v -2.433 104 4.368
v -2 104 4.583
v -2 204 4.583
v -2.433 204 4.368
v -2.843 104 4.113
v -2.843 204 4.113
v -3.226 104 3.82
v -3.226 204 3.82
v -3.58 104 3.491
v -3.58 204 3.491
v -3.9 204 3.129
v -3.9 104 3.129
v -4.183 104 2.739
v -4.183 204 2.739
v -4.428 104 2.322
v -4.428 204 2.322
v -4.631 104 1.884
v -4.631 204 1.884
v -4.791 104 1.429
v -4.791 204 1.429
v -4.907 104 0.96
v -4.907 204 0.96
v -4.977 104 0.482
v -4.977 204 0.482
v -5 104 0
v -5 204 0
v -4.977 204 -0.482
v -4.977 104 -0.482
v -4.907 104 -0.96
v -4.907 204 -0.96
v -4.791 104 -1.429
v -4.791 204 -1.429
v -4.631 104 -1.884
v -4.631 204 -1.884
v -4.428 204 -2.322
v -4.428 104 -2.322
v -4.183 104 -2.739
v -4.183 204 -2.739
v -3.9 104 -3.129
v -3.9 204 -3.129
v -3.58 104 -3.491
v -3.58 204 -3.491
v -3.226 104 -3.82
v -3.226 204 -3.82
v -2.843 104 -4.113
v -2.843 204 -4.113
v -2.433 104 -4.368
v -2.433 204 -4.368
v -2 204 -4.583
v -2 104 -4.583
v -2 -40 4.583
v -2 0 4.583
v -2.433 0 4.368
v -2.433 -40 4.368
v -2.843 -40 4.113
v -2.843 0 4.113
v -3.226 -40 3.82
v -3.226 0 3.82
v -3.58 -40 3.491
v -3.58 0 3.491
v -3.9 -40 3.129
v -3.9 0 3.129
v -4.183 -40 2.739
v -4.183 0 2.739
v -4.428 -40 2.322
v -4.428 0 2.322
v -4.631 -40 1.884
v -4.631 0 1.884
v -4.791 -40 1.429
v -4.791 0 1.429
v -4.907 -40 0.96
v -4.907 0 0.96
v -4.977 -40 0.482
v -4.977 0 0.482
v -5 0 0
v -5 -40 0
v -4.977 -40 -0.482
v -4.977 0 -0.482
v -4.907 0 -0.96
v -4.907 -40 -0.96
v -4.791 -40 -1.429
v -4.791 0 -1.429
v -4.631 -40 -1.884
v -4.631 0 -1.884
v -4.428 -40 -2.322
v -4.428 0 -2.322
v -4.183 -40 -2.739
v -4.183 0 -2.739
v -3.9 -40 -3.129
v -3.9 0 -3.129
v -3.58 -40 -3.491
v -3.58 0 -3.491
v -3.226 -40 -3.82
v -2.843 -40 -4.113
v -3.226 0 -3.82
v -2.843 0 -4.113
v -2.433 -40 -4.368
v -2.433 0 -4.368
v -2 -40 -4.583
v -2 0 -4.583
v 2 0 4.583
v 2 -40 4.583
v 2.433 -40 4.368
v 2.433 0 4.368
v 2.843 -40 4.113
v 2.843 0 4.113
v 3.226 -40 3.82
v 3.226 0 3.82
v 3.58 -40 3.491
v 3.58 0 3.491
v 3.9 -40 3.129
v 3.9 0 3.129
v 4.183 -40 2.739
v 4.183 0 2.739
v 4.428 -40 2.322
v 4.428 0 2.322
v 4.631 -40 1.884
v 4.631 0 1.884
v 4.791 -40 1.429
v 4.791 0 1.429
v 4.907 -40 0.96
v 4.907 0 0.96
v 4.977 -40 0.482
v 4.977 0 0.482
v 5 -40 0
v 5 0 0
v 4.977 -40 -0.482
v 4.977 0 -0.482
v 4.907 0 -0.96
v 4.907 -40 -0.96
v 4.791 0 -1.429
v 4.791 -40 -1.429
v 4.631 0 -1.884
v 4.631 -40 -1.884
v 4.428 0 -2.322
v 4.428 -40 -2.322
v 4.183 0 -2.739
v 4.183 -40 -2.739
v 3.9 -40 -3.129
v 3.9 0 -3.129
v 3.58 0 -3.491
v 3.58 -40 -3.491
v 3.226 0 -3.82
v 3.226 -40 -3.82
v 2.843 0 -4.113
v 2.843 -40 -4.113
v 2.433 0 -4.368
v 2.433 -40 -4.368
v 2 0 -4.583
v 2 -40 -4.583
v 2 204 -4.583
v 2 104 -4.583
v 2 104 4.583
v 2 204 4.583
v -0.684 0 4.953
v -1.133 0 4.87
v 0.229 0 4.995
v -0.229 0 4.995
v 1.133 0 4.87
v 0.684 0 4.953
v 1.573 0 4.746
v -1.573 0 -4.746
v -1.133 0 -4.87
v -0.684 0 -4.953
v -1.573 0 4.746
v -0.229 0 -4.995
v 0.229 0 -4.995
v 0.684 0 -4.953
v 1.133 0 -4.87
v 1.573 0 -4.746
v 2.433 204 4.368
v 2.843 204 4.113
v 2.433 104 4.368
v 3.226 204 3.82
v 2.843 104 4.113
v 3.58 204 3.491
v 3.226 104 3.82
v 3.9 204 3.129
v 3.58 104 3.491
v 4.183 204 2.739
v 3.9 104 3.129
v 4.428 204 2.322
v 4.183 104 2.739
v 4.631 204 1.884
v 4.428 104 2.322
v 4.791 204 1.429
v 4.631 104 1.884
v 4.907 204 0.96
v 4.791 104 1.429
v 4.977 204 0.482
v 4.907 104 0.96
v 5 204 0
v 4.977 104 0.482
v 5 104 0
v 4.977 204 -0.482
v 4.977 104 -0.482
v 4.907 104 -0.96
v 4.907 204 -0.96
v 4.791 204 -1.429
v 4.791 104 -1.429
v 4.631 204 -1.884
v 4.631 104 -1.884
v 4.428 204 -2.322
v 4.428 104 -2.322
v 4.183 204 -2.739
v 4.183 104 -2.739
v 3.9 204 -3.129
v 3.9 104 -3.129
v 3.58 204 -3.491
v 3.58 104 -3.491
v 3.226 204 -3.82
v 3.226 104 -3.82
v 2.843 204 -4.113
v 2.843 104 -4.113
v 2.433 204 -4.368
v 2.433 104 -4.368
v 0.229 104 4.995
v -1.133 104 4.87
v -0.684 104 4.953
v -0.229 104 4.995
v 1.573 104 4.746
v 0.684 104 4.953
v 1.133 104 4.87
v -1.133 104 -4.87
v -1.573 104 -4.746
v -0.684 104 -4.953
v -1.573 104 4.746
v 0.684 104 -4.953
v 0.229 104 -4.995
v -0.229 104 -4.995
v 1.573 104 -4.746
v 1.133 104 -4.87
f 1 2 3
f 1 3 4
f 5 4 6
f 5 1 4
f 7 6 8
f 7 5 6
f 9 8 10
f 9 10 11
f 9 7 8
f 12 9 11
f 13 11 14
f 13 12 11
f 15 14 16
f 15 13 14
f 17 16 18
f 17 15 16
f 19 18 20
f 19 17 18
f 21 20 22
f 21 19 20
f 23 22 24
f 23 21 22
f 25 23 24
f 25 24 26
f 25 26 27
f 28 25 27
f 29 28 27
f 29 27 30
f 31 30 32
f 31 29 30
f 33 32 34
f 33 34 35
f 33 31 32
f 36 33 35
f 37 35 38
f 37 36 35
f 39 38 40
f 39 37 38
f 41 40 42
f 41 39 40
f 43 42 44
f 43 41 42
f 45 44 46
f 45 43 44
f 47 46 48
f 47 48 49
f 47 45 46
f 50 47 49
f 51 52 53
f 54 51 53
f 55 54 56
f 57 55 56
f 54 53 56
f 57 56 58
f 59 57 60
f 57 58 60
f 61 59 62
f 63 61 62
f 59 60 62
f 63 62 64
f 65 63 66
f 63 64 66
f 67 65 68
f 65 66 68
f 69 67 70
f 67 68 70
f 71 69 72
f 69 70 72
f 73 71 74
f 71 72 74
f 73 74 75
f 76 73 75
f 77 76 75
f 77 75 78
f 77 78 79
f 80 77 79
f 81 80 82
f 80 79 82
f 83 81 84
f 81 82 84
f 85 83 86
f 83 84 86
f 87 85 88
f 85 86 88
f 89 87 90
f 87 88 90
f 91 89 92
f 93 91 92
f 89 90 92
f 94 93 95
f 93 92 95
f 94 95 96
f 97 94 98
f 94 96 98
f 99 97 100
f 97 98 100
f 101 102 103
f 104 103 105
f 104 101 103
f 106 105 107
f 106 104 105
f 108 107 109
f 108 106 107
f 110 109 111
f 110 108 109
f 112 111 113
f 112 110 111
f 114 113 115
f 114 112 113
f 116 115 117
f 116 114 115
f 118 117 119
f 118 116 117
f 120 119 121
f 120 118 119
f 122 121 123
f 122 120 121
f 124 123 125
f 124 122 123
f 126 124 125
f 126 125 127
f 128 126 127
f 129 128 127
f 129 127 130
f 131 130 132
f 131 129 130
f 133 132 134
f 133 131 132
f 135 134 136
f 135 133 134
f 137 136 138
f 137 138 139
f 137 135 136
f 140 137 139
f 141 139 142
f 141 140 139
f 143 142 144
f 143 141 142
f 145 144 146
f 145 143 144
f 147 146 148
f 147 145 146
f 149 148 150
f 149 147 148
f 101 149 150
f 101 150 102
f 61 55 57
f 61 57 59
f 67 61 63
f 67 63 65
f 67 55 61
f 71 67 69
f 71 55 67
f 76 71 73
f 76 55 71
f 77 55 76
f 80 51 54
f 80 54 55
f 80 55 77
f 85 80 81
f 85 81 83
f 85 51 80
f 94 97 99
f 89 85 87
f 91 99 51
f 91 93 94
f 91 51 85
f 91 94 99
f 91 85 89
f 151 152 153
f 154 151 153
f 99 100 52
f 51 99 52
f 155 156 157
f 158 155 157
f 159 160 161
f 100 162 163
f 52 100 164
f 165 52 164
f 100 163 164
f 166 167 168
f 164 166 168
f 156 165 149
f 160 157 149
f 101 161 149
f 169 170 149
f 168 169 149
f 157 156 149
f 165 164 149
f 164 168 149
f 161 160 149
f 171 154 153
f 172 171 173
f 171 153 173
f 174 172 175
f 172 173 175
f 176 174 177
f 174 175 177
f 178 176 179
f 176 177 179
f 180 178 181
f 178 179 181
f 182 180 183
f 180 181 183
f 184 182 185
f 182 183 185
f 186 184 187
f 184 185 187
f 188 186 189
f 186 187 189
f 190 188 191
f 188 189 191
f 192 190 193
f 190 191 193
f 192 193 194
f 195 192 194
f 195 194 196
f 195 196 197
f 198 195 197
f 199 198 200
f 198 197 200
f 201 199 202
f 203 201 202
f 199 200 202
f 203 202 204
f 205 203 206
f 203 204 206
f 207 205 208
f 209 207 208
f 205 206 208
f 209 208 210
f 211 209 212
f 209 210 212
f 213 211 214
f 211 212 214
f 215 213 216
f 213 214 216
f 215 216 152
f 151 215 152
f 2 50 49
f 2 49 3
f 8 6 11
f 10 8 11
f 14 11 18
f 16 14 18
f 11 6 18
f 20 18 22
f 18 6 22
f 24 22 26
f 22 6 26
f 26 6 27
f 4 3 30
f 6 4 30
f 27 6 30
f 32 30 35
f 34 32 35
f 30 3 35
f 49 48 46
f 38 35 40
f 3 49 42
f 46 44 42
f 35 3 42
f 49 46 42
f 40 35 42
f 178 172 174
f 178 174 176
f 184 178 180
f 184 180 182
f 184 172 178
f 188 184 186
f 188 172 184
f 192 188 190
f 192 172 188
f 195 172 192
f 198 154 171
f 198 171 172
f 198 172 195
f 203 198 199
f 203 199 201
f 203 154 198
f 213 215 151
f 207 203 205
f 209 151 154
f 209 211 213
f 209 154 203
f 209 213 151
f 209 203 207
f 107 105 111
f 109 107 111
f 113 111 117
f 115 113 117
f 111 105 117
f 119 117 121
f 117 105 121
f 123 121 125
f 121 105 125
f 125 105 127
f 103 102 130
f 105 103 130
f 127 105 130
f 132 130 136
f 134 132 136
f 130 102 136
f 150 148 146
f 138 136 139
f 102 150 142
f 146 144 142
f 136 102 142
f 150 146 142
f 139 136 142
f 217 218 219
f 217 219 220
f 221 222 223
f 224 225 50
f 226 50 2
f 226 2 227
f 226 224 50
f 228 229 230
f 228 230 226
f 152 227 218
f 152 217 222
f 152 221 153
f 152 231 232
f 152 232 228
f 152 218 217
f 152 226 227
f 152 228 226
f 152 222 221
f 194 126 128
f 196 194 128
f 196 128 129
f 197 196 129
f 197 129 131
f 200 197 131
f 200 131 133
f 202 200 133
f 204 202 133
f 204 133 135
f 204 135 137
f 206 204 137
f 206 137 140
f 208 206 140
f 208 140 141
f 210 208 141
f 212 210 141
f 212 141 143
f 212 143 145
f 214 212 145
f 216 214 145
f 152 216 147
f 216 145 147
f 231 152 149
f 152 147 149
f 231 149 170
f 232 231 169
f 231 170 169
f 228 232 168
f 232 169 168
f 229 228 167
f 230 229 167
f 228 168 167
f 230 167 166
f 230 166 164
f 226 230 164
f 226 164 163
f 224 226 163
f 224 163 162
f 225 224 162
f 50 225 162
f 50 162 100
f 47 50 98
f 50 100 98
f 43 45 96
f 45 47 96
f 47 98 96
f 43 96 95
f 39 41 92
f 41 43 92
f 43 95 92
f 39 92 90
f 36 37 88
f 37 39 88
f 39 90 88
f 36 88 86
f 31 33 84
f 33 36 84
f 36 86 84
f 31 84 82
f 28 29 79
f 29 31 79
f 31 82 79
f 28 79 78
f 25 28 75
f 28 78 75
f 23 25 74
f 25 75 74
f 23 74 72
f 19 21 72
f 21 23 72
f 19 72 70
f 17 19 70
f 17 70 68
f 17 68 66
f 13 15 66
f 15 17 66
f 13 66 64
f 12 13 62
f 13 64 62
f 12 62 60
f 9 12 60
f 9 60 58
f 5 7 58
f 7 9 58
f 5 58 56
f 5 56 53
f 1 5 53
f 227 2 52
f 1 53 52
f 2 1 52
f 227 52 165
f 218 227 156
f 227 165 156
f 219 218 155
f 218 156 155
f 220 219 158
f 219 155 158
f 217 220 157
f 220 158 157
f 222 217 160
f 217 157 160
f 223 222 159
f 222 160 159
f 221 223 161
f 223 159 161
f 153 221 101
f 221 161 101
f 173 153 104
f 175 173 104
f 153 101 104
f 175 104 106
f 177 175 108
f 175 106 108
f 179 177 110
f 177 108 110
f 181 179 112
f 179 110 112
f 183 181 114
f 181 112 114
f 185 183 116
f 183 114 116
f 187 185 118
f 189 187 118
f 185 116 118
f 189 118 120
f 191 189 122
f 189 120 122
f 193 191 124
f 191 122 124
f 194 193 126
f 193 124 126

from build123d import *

# Parameters (mm, degrees)
SKETCH1_R           = 5
BOSS_EXTRUDE1_DEPTH = 104
BOSS_EXTRUDE2_DEPTH = 100
BOSS_EXTRUDE3_START = -104
BOSS_EXTRUDE3_DEPTH = 40


with BuildPart() as part:
    # Sketch1 → Boss-Extrude1 (new body)
    with BuildSketch(Plane(origin=(0, 0, 0), x_dir=(1, 0, 0), z_dir=(0, 1, 0))):
        Circle(SKETCH1_R)
    extrude(amount=BOSS_EXTRUDE1_DEPTH)

    # Sketch2 → Boss-Extrude2 (add)
    with BuildSketch(Plane(origin=(0, 104, 0), x_dir=(1, 0, 0), z_dir=(0, 1, 0))):
        with BuildLine():
            Line((-2, 4.582576), (-2, -4.582576))
            ThreePointArc((-2, -4.582576), (-5, 0), (-2, 4.582576))
        make_face()
        with BuildLine():
            Line((2, 4.582576), (2, -4.582576))
            ThreePointArc((2, -4.582576), (5, 0), (2, 4.582576))
        make_face()
    extrude(amount=BOSS_EXTRUDE2_DEPTH)

    # Sketch2<2> → Boss-Extrude3 (add)
    with BuildSketch(Plane(origin=(0, 104, 0), x_dir=(1, 0, 0), z_dir=(0, 1, 0)).offset(BOSS_EXTRUDE3_START)):
        with BuildLine():
            Line((-2, 4.582576), (-2, -4.582576))
            ThreePointArc((-2, -4.582576), (-5, 0), (-2, 4.582576))
        make_face()
        with BuildLine():
            Line((2, 4.582576), (2, -4.582576))
            ThreePointArc((2, -4.582576), (5, 0), (2, 4.582576))
        make_face()
    extrude(amount=-BOSS_EXTRUDE3_DEPTH)


solid = part.part
